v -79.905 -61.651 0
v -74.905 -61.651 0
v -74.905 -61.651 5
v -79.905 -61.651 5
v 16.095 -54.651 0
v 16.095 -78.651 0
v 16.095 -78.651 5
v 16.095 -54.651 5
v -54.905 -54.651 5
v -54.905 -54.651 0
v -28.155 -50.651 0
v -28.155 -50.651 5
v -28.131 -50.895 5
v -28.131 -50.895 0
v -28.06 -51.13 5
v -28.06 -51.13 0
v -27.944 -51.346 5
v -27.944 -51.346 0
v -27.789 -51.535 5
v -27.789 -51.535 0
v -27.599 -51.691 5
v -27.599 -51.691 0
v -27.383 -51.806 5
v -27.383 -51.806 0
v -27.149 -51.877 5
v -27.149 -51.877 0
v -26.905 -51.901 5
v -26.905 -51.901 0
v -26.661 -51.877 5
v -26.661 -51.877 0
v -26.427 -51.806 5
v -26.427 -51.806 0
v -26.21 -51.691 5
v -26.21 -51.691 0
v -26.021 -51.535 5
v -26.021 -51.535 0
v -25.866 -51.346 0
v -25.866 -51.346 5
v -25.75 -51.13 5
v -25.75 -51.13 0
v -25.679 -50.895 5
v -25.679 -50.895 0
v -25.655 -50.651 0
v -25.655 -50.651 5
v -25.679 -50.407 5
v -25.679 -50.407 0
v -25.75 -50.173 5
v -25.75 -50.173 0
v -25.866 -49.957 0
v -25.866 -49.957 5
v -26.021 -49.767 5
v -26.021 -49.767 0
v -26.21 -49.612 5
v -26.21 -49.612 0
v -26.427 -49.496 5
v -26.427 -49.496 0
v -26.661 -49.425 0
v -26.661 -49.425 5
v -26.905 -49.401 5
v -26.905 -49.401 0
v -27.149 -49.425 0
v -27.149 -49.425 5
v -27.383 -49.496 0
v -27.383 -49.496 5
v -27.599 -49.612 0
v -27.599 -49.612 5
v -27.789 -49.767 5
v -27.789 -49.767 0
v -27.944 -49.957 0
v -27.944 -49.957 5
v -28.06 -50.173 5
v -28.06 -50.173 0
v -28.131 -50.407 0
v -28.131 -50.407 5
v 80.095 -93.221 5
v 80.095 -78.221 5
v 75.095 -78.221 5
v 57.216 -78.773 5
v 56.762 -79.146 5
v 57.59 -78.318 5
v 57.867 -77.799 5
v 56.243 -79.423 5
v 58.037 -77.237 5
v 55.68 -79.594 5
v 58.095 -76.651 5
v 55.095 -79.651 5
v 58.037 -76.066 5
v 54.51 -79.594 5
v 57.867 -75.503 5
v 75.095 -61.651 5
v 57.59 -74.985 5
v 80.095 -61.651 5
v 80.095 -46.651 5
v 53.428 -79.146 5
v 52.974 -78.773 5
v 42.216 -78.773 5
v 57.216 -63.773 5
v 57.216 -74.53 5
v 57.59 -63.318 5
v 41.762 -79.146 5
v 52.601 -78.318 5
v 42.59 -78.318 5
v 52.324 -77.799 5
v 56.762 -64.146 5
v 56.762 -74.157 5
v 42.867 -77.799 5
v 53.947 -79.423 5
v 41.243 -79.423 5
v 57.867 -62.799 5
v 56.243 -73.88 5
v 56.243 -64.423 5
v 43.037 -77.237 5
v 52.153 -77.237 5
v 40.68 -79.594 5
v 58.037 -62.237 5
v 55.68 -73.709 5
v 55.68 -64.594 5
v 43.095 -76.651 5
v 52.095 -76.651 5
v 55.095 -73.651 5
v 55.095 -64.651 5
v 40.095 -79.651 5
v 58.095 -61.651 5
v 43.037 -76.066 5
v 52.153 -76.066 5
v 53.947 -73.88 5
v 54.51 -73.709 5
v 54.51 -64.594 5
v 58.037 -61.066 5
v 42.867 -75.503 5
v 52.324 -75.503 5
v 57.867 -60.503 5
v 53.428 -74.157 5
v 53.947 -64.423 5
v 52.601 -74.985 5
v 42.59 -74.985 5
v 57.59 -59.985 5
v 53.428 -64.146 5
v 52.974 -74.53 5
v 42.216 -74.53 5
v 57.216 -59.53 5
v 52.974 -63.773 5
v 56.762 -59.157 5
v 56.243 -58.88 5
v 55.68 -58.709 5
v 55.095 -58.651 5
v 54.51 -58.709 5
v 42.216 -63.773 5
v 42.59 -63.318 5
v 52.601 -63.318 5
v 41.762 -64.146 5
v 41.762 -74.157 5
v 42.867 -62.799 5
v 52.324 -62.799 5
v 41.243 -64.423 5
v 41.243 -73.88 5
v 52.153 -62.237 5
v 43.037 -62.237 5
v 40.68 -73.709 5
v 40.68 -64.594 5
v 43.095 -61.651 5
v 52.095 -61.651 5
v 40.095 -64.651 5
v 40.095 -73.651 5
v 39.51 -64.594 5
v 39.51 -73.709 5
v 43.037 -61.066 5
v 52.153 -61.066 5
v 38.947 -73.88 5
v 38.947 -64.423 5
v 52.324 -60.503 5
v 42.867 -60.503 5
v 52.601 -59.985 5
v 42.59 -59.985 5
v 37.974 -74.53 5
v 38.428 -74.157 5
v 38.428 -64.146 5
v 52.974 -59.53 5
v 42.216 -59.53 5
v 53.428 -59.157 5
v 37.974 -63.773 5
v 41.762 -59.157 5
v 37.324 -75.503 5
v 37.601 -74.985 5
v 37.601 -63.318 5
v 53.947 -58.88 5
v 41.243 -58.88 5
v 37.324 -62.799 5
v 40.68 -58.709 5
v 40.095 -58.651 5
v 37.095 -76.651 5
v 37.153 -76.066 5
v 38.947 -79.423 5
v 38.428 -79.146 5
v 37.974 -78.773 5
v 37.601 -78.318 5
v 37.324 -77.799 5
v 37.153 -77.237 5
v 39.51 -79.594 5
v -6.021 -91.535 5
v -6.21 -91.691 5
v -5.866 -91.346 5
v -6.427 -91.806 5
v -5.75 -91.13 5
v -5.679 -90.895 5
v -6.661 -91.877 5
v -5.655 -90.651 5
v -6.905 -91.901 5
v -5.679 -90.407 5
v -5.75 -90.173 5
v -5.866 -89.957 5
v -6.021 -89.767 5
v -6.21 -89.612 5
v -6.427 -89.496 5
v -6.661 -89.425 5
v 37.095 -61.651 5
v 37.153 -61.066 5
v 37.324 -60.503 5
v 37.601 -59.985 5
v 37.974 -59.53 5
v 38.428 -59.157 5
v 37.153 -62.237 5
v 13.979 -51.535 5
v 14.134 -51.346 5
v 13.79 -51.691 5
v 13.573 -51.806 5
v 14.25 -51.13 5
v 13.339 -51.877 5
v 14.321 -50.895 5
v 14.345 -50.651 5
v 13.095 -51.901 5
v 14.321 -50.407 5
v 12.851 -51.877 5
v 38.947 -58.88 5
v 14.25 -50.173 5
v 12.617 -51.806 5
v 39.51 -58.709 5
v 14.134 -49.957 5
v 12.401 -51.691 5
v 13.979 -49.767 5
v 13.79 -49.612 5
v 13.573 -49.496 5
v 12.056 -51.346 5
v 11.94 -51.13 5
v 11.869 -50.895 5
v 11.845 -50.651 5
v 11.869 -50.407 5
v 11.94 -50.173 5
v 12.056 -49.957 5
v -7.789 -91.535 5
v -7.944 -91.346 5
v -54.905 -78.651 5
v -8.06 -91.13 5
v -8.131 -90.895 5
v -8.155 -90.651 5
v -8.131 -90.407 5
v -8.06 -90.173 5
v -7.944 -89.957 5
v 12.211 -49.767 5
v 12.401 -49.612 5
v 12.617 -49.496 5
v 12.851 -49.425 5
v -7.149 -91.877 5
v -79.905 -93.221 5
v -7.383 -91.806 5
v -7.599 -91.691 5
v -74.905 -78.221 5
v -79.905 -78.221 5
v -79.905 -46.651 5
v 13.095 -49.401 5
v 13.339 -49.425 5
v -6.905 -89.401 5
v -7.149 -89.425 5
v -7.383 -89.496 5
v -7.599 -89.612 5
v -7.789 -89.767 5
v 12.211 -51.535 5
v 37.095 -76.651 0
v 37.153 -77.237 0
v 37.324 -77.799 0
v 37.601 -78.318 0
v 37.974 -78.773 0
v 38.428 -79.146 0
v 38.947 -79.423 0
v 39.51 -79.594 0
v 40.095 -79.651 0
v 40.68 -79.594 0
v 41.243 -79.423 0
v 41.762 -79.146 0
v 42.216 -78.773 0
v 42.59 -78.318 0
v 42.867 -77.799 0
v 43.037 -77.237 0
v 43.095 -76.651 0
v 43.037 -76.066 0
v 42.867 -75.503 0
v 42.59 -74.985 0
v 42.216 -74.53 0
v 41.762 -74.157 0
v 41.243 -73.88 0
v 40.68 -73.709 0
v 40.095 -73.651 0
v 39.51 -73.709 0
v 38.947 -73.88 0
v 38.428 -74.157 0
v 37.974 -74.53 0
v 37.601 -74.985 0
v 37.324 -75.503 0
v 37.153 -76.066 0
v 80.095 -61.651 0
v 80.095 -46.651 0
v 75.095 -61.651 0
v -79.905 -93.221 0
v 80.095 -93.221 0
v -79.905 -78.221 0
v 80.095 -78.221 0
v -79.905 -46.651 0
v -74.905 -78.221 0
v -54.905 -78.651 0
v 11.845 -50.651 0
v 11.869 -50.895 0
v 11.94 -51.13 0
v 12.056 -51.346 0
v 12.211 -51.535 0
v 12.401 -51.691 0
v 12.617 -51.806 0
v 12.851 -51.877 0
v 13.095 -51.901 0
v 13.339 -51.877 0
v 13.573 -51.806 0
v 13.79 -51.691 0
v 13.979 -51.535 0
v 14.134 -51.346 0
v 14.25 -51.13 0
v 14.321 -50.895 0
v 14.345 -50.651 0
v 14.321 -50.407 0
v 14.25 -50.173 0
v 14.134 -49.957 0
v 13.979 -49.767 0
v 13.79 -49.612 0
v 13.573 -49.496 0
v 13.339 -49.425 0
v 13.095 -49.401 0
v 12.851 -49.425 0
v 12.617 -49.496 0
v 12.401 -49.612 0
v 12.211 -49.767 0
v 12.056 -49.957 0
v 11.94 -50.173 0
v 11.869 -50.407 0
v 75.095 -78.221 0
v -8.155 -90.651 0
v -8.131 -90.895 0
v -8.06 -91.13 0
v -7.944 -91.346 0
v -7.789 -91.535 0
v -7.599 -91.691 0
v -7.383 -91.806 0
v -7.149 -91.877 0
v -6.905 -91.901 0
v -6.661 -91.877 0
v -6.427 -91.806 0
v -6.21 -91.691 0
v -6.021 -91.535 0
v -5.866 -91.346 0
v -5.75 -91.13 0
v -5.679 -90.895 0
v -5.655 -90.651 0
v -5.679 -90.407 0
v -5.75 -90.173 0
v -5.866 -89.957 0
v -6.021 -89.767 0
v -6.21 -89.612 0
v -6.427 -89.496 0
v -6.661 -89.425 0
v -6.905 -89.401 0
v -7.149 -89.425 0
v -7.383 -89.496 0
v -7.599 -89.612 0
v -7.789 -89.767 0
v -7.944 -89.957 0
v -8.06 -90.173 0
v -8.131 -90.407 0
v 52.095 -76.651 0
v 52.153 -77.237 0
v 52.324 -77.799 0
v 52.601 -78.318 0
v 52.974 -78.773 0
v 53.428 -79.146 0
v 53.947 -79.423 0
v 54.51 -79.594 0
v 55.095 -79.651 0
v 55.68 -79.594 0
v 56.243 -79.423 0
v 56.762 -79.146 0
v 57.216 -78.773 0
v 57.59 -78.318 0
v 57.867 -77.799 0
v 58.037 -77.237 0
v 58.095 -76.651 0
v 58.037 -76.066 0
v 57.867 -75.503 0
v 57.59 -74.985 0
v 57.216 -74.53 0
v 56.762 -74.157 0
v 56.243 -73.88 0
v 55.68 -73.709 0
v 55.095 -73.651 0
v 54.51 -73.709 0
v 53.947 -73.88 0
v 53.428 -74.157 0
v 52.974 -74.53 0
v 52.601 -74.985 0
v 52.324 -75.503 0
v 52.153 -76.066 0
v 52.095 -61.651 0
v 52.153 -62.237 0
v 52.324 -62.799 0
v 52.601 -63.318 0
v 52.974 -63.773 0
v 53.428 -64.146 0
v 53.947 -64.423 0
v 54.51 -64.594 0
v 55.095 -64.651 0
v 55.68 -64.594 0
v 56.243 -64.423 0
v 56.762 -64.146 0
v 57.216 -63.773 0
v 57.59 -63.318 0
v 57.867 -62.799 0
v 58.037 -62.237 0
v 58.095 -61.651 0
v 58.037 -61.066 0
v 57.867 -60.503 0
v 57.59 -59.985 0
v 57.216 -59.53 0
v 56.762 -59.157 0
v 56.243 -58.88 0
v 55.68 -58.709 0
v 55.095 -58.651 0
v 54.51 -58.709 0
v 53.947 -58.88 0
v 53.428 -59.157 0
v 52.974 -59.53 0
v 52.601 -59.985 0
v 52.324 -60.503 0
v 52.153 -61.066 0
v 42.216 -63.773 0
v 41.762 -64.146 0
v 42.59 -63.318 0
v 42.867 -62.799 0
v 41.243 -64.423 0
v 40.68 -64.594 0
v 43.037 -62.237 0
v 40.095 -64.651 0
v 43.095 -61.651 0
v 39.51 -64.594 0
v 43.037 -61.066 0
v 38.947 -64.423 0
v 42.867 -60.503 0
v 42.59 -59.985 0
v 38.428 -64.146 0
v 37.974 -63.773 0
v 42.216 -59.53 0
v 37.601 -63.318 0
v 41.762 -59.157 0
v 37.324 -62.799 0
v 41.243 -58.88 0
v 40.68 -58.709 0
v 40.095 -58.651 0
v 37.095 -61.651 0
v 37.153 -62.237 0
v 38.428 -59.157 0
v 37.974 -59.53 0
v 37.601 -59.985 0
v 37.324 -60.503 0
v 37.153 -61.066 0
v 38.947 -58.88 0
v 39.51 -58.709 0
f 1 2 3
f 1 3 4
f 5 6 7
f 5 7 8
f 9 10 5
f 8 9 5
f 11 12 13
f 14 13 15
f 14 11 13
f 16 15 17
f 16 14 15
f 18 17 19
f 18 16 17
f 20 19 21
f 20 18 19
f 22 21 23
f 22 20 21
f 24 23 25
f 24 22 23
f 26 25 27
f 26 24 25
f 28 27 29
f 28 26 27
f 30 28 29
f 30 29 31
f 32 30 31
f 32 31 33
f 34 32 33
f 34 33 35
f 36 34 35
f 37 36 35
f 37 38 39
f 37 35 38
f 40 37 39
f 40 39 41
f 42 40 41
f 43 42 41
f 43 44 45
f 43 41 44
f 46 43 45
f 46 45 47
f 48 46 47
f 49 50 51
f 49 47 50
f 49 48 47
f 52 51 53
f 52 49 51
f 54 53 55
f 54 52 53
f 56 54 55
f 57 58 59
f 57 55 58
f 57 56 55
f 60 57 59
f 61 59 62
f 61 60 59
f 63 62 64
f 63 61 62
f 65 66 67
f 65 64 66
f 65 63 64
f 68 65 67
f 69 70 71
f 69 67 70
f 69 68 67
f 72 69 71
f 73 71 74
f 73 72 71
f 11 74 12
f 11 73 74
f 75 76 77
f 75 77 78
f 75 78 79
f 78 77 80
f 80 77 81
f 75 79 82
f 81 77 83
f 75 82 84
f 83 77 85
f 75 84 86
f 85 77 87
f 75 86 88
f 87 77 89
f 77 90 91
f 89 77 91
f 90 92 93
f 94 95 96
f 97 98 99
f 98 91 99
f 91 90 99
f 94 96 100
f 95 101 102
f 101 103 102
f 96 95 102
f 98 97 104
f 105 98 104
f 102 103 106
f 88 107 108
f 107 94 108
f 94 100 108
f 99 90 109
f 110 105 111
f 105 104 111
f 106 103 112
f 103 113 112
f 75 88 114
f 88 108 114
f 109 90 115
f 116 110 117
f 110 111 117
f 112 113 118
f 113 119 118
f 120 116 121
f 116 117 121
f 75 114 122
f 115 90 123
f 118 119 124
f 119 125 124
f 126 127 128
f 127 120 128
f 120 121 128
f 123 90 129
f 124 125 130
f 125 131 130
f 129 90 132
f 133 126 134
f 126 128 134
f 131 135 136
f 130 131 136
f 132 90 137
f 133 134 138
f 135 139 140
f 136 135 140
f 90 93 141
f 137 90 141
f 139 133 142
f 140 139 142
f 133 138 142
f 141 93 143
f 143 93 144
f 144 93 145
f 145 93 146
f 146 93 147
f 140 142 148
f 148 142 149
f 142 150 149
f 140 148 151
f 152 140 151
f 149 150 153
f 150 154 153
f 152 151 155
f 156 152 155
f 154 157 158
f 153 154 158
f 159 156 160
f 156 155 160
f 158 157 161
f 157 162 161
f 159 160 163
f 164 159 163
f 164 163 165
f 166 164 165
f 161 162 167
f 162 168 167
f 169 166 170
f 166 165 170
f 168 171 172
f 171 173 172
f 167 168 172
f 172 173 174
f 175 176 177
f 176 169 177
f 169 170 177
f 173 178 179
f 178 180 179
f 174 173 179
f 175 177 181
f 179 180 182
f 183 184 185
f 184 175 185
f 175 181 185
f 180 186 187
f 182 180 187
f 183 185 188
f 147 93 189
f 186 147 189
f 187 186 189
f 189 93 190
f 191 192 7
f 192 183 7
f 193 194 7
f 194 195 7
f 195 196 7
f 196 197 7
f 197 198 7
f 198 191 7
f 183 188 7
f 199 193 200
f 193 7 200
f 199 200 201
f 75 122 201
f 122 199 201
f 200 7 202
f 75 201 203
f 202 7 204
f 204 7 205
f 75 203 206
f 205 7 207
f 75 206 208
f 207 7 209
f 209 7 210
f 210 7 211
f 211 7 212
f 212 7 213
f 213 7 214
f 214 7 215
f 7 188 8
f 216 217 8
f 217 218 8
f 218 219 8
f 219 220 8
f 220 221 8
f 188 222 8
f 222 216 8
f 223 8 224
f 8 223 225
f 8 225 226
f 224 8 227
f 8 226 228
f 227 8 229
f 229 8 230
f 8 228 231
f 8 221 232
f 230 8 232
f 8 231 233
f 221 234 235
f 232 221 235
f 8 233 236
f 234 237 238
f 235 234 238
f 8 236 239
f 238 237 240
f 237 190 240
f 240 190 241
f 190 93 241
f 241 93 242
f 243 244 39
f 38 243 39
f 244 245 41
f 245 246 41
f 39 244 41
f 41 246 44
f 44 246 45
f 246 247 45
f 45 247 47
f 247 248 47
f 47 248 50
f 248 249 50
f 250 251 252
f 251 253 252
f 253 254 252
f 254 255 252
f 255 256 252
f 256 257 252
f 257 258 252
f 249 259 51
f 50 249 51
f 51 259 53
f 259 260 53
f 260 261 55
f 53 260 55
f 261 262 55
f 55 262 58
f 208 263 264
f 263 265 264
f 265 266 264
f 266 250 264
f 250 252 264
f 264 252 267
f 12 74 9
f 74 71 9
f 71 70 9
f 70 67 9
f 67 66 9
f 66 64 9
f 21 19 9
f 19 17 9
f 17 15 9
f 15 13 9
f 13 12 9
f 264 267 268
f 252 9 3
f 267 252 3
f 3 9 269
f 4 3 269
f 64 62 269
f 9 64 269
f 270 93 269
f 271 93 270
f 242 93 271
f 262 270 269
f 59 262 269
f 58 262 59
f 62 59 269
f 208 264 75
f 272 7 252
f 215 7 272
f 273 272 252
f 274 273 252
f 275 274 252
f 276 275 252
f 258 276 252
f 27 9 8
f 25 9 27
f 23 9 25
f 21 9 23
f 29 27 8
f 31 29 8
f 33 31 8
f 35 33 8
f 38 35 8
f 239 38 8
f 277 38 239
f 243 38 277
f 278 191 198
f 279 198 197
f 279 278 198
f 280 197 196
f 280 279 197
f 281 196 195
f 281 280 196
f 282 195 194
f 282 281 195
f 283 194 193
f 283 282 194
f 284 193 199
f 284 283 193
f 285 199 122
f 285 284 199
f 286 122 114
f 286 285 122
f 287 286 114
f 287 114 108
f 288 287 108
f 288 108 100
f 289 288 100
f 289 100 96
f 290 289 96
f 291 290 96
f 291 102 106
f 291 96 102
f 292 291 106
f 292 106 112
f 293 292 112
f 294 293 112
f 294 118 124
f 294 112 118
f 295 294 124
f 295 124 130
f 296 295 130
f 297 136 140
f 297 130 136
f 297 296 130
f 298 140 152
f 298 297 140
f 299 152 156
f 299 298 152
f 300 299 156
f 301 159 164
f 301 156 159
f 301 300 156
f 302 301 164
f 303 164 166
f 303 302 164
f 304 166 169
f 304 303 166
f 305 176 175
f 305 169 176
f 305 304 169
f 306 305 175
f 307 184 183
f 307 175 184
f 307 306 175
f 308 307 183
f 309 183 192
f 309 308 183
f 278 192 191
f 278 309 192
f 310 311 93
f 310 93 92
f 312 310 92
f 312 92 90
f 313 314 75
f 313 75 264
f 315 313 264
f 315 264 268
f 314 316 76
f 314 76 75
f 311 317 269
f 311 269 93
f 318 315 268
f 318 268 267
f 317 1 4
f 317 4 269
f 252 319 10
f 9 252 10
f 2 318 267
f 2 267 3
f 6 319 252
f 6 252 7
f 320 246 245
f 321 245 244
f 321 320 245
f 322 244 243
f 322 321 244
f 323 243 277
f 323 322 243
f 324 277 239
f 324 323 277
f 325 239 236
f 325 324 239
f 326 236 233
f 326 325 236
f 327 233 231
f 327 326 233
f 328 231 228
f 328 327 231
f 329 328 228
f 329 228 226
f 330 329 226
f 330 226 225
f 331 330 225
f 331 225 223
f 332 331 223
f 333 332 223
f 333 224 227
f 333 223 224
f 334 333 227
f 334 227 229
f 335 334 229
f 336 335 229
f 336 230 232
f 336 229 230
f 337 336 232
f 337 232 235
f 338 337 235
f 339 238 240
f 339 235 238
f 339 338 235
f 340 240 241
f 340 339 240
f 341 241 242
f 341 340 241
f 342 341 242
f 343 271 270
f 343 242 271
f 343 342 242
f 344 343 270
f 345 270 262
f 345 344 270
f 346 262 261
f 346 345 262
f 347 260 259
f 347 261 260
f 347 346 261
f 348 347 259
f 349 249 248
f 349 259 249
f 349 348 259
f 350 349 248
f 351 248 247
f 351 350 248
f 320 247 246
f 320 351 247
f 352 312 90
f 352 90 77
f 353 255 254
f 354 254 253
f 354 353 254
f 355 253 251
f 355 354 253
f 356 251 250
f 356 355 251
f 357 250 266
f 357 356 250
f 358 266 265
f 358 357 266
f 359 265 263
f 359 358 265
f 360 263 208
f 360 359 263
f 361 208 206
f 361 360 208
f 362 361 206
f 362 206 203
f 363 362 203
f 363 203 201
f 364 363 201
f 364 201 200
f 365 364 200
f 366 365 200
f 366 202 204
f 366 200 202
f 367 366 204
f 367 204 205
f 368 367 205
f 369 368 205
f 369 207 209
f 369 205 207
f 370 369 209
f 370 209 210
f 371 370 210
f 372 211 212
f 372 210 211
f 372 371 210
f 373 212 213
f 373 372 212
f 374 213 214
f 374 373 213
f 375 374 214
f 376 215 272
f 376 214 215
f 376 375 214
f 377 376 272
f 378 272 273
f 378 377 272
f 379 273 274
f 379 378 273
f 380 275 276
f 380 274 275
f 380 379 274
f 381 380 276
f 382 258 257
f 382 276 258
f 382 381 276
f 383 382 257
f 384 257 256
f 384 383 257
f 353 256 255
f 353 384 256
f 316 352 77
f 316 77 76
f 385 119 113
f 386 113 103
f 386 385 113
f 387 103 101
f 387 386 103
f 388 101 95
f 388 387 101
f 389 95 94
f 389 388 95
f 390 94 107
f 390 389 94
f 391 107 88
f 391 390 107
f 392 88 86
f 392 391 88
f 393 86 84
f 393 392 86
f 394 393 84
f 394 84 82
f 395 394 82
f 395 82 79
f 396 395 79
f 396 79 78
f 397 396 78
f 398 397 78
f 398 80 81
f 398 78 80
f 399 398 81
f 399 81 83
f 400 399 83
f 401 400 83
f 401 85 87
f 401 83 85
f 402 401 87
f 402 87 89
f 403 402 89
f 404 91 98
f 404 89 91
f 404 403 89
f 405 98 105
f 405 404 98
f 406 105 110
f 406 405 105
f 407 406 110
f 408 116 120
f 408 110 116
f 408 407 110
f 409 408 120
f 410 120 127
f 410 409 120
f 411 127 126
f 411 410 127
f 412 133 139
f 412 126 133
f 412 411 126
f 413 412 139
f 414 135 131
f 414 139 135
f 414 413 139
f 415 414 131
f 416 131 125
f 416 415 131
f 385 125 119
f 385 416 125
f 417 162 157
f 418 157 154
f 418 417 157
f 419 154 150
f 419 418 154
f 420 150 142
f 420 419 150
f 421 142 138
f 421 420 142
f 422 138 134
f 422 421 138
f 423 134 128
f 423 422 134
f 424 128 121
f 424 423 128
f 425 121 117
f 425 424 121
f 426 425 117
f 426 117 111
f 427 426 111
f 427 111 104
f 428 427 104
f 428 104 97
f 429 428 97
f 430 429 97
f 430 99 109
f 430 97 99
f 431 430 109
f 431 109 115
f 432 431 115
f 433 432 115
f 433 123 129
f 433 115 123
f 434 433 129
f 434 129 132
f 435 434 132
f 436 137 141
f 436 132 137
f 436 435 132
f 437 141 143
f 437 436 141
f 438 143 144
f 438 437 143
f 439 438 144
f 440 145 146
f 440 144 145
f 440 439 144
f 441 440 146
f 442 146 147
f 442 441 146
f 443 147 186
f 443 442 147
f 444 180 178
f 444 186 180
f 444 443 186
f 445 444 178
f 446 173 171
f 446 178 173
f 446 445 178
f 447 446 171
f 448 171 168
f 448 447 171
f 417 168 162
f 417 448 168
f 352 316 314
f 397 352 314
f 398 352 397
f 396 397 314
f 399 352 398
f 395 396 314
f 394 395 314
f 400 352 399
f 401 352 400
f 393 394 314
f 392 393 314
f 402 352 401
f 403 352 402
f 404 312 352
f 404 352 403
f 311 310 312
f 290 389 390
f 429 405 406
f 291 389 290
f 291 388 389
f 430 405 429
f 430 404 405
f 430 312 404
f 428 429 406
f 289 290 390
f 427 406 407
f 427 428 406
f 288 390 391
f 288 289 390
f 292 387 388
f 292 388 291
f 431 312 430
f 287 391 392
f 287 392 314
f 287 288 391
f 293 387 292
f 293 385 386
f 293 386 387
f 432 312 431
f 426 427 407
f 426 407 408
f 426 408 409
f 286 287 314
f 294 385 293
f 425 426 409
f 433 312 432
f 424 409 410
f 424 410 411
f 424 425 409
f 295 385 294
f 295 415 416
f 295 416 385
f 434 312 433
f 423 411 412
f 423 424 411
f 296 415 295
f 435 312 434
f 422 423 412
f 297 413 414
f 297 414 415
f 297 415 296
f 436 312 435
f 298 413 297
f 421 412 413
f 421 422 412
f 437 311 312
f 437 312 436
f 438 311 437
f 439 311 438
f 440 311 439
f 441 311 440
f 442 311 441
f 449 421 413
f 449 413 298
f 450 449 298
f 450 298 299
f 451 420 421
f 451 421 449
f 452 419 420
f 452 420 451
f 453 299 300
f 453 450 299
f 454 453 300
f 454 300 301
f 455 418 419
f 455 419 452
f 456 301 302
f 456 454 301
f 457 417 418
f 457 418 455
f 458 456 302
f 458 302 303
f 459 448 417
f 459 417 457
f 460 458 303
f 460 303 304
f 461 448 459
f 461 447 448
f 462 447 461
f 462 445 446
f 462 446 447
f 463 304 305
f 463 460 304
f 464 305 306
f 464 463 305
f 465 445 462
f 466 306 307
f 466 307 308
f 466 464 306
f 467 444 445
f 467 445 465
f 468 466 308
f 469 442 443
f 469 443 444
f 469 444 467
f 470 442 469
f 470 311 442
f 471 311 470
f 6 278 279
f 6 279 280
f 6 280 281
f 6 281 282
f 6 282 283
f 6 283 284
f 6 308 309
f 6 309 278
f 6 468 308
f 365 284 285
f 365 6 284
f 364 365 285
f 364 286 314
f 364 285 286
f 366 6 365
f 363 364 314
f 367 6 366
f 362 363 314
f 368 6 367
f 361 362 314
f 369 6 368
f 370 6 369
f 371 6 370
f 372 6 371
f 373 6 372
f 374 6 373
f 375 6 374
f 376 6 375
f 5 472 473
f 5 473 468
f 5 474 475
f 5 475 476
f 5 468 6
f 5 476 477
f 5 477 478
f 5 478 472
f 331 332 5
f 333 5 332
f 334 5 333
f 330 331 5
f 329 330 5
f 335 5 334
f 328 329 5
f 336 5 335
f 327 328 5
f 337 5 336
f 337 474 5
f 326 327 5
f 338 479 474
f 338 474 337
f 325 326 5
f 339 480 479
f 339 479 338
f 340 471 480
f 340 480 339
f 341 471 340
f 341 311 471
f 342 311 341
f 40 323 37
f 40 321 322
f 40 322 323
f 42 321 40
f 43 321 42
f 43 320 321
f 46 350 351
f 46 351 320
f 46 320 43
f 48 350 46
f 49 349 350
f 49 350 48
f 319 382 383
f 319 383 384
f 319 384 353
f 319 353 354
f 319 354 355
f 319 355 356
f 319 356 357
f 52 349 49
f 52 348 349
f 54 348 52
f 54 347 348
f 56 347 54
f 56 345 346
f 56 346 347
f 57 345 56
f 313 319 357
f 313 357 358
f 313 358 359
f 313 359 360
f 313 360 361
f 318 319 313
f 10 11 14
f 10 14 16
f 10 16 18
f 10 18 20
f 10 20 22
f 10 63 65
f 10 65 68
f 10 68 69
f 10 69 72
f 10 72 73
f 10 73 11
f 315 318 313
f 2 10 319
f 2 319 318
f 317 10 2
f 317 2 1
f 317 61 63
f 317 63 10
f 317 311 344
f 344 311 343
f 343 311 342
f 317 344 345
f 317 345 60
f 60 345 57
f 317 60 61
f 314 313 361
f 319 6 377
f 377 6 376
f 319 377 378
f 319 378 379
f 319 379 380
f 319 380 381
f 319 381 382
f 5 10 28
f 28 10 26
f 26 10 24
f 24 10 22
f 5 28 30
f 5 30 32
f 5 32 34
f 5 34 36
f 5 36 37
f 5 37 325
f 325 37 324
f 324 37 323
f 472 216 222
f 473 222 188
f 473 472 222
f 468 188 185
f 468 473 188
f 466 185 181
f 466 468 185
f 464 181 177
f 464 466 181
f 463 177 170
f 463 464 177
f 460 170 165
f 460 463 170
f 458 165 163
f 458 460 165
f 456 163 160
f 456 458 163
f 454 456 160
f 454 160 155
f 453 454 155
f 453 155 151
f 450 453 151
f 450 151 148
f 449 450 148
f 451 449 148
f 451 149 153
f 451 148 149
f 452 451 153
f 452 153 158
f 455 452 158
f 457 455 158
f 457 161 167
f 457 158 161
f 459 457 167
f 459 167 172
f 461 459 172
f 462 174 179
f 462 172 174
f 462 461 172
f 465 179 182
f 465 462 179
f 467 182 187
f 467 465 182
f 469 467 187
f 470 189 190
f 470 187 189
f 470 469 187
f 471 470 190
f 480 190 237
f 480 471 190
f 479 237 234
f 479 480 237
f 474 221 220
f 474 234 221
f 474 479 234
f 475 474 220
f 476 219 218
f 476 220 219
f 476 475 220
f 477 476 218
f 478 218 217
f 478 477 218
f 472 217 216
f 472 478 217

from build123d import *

# Parameters (mm, degrees)
BOSS_EXTRU_2_DEPTH      = 5
ESQUISSE1_4_W           = 71
ESQUISSE1_4_H           = 24
ENL_V_MAT_EXTRU_2_DEPTH = 7
ESQUISSE1_5_R           = 3
ESQUISSE1_5_R_2         = 1.25
ENL_V_MAT_EXTRU_3_DEPTH = 10


with BuildPart() as part:
    # Esquisse1 → Boss.-Extru.2 (new body)
    with BuildSketch(Plane.XY):
        Polygon((-79.904859092, -61.651270208), (-79.904859092, -46.651270208), (80.095140908, -46.651270208), (80.095140908, -61.651270208), (75.095140908, -61.651270208), (75.095140908, -78.221270208), (80.095140908, -78.221270208), (80.095140908, -93.221270208), (-79.904859092, -93.221270208), (-79.904859092, -78.221270208), (-74.904859092, -78.221270208), (-74.904859092, -61.651270208), align=None)
    extrude(amount=BOSS_EXTRU_2_DEPTH)

    # Esquisse1<4> → Enlèv. mat.-Extru.2 (cut)
    with BuildSketch(Plane.XY):
        with Locations((-19.404859092, -66.651270208)):
            Rectangle(ESQUISSE1_4_W, ESQUISSE1_4_H)
    extrude(amount=ENL_V_MAT_EXTRU_2_DEPTH, mode=Mode.SUBTRACT)

    # Esquisse1<5> → Enlèv. mat.-Extru.3 (cut)
    with BuildSketch(Plane.XY):
        with Locations((40.095140908, -61.651270208)):
            Circle(ESQUISSE1_5_R)
        with Locations((40.095140908, -76.651270208)):
            Circle(ESQUISSE1_5_R)
        with Locations((55.095140908, -61.651270208)):
            Circle(ESQUISSE1_5_R)
        with Locations((55.095140908, -76.651270208)):
            Circle(ESQUISSE1_5_R)
        with Locations((13.095140908, -50.651270208)):
            Circle(ESQUISSE1_5_R_2)
        with Locations((-26.904859092, -50.651270208)):
            Circle(ESQUISSE1_5_R_2)
        with Locations((-6.904859092, -90.651270208)):
            Circle(ESQUISSE1_5_R_2)
    extrude(amount=ENL_V_MAT_EXTRU_3_DEPTH, mode=Mode.SUBTRACT)


solid = part.part
